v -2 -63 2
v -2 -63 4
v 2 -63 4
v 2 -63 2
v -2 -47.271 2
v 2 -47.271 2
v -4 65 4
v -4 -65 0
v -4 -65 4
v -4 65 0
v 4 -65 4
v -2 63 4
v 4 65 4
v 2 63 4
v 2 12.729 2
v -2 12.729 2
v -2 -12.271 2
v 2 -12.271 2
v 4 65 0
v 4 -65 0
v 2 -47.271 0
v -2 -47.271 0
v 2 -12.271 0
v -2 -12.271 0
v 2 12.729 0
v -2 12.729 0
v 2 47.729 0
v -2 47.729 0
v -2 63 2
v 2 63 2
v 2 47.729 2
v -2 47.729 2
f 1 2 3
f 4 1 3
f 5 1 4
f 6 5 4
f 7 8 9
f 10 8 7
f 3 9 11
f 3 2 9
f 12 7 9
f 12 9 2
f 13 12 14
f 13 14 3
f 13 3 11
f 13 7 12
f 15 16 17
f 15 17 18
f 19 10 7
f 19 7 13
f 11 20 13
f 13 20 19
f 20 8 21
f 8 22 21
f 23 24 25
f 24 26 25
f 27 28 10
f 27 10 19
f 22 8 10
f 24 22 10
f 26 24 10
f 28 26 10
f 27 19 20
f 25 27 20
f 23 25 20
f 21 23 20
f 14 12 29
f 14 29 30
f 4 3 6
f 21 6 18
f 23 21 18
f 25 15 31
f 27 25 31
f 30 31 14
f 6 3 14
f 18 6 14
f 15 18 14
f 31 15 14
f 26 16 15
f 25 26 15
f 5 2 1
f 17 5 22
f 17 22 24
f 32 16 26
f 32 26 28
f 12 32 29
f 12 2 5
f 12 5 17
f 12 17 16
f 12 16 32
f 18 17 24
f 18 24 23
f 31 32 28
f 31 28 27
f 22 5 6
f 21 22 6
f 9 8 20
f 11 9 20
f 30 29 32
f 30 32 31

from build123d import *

# Parameters (mm, degrees)
F0_W     = 8
F0_H     = 130
F1_DEPTH = 4
F2_W     = 4
F2_H     = 126
F3_DEPTH = 2
F4_W     = 4
F4_H     = 35
F5_DEPTH = 2.001


with BuildPart() as f1:
    # F0 (on Top) → F1 (new body)
    with BuildSketch(Plane.XY):
        Rectangle(F0_W, F0_H)
    extrude(amount=F1_DEPTH)

    # F2 (on face) → F3 (cut)
    with BuildSketch(Plane.XY.offset(4)):
        Rectangle(F2_W, F2_H)
    extrude(amount=-F3_DEPTH, mode=Mode.SUBTRACT)

    # F4 (on face) → F5 (cut, through all)
    with BuildSketch(Plane.XY.offset(2)):
        with Locations((0, -29.770957)):
            Rectangle(F4_W, F4_H)
        with Locations((0, 30.229043)):
            Rectangle(F4_W, F4_H)
    extrude(amount=-F5_DEPTH, mode=Mode.SUBTRACT)


solid = f1.part
